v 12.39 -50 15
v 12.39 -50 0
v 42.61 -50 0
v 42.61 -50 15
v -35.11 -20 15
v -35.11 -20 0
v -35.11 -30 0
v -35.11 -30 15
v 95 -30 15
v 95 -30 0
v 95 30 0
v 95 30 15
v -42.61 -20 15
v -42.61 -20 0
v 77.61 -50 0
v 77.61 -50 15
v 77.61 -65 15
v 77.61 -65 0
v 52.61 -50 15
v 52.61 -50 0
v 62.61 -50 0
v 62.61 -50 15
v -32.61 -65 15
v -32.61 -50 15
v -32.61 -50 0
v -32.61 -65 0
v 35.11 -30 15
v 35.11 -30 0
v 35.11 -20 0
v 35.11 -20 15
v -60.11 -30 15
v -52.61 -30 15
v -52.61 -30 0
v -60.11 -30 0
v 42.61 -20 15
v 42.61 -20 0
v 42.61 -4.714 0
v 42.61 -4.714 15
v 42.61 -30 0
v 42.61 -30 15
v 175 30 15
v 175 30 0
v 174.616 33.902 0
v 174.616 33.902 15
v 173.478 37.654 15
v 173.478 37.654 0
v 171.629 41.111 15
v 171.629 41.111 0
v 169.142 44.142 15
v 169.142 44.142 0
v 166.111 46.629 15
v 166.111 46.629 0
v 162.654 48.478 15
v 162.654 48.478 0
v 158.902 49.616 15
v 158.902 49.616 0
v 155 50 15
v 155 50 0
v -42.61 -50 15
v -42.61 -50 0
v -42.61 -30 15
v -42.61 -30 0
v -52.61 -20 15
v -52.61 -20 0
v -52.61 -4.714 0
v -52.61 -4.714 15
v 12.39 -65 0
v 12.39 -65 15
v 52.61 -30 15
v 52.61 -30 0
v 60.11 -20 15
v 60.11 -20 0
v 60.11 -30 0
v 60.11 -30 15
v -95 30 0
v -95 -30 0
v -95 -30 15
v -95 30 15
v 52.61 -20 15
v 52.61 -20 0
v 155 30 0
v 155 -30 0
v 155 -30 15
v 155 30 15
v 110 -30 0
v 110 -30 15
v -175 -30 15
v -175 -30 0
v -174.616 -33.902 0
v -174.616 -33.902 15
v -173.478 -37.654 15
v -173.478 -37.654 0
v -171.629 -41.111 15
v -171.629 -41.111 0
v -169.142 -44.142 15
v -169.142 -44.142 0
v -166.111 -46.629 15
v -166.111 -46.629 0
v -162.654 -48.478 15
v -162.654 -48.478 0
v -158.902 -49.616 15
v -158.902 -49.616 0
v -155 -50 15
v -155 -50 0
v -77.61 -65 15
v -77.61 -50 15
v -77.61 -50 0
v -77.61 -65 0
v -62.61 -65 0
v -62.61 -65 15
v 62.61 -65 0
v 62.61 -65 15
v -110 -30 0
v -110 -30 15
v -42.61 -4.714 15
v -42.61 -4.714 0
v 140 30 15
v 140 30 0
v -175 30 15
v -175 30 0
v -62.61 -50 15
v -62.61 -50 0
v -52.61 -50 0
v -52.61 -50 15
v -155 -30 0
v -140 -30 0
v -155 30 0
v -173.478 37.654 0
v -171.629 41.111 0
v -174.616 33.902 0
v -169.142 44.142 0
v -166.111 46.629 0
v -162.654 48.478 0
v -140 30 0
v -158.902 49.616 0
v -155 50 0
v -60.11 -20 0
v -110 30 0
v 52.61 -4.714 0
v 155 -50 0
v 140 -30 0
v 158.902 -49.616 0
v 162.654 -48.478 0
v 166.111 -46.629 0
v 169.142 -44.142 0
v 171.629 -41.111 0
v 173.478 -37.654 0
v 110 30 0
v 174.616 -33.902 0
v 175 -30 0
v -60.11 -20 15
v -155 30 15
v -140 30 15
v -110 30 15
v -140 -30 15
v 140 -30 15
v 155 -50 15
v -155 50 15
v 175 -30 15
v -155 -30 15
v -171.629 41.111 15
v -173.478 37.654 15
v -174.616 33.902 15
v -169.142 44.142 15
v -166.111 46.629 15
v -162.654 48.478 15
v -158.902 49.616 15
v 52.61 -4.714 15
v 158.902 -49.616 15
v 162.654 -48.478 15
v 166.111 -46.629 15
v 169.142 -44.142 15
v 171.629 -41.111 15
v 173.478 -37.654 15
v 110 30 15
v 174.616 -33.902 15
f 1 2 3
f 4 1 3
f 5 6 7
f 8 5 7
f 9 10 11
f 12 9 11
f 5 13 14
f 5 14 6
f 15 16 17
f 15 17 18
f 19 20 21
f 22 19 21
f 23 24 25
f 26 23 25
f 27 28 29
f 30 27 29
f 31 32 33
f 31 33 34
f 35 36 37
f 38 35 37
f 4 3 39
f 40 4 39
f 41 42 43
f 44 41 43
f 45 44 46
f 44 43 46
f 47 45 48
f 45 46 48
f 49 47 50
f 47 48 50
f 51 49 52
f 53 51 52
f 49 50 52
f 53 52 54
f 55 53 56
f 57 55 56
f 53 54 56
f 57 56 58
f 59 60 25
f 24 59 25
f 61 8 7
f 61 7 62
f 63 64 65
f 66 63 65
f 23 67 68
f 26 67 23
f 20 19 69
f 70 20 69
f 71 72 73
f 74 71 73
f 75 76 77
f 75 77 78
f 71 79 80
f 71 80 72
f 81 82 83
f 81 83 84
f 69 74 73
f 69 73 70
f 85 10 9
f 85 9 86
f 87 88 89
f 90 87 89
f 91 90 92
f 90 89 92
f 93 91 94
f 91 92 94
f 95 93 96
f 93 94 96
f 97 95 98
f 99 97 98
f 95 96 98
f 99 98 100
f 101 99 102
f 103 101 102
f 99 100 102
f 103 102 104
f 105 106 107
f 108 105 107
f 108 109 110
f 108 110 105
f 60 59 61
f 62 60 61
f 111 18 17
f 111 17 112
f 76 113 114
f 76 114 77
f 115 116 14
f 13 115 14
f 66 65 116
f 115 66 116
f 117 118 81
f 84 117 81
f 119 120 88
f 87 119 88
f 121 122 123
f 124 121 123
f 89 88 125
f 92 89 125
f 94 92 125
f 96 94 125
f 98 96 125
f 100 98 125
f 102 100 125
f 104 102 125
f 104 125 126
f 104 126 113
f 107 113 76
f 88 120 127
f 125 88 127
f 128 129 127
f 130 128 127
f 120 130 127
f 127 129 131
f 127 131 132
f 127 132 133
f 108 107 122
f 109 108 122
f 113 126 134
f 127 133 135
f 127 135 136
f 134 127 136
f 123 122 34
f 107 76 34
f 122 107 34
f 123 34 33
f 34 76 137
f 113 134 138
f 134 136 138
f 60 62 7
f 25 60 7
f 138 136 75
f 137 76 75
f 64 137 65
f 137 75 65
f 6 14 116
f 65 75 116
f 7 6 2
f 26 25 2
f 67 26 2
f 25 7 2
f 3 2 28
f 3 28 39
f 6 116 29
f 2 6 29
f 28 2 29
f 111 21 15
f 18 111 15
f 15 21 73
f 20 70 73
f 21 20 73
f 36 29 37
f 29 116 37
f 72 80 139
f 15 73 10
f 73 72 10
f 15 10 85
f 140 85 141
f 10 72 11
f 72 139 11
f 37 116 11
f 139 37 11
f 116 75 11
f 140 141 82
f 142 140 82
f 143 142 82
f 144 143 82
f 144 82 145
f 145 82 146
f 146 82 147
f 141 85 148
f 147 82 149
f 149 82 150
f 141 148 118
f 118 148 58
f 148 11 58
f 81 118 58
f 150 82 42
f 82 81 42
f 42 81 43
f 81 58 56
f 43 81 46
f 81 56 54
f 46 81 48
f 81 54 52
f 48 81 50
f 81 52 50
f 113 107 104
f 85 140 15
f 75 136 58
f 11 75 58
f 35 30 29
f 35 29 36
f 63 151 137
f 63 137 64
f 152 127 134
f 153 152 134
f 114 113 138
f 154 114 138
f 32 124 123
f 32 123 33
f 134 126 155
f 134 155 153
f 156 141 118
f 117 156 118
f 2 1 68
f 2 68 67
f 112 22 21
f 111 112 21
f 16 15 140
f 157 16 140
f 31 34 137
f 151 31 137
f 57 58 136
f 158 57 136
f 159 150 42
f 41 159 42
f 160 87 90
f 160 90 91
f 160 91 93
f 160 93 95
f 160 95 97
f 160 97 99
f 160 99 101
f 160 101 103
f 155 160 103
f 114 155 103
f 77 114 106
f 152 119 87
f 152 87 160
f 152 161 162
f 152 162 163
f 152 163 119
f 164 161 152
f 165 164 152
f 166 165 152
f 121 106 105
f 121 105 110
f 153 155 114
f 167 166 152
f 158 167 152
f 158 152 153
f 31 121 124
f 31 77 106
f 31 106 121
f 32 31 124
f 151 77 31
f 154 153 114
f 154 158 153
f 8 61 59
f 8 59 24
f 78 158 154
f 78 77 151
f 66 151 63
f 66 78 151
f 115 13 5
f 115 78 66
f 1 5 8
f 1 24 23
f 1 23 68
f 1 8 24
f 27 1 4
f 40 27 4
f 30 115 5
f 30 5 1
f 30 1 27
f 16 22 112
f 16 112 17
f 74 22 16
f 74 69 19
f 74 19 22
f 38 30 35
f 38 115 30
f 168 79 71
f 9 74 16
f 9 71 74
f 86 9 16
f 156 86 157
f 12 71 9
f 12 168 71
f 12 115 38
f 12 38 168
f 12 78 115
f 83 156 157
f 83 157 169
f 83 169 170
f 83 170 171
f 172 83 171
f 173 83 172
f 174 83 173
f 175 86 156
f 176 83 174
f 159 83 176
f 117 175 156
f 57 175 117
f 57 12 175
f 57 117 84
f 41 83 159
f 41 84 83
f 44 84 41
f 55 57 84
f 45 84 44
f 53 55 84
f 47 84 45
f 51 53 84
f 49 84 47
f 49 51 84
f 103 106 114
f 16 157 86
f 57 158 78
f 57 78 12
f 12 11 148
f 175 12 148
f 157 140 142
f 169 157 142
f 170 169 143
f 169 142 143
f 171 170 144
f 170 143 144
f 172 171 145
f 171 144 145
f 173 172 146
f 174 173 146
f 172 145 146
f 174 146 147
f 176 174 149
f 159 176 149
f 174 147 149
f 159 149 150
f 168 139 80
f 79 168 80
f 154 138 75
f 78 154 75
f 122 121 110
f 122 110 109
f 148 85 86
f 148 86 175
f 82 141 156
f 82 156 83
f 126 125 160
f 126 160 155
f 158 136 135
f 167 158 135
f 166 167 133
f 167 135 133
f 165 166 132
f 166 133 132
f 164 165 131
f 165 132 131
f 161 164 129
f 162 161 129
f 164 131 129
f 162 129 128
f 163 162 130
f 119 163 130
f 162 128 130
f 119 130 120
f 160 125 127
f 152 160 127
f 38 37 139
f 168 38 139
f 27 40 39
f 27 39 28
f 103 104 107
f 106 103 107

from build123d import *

# Parameters (mm, degrees)
ESQUISSE1_W             = 15
ESQUISSE1_H             = 60
BOSS_EXTRU_1_DEPTH      = 15
ESQUISSE2_W             = 10
ESQUISSE2_H             = 8.70960714
ESQUISSE2_H_2           = 11.830290252
ENL_V_MAT_EXTRU_1_DEPTH = 183.619823677
ESQUISSE3_W             = 15
ESQUISSE3_H             = 15
ESQUISSE3_W_2           = 45
BOSS_EXTRU_2_DEPTH      = 15


with BuildPart() as part:
    # Esquisse1 → Boss.-Extru.1 (new body)
    with BuildSketch(Plane.XY):
        with BuildLine():
            ThreePointArc((-175, -30), (-169.142135624, -44.142135624), (-155, -50))
            Line((-155, -50), (155, -50))
            ThreePointArc((155, -50), (169.142135624, -44.142135624), (175, -30))
            Line((175, -30), (175, 30))
            ThreePointArc((175, 30), (169.142135624, 44.142135624), (155, 50))
            Line((155, 50), (-155, 50))
            ThreePointArc((-155, 50), (-169.142135624, 44.142135624), (-175, 30))
            Line((-175, 30), (-175, -30))
        make_face()
        with Locations((-147.5, 0)):
            Rectangle(ESQUISSE1_W, ESQUISSE1_H, mode=Mode.SUBTRACT)
        Polygon((-52.61, -30), (-60.11, -30), (-60.11, -20), (-52.61, -20), (-52.61, -4.714066344), (-42.61, -4.714066344), (-42.61, -20), (-35.11, -20), (-35.11, -30), (-42.61, -30), (-42.61, -45.27278392), (-52.61, -45.27278392), align=None, mode=Mode.SUBTRACT)
        Polygon((42.61, -30), (35.11, -30), (35.11, -20), (42.61, -20), (42.61, -4.714066344), (52.61, -4.714066344), (52.61, -20), (60.11, -20), (60.11, -30), (52.61, -30), (52.61, -45.27278392), (42.61, -45.27278392), align=None, mode=Mode.SUBTRACT)
        with Locations((-102.5, 0)):
            Rectangle(ESQUISSE1_W, ESQUISSE1_H, mode=Mode.SUBTRACT)
        with Locations((102.5, 0)):
            Rectangle(ESQUISSE1_W, ESQUISSE1_H, mode=Mode.SUBTRACT)
        with Locations((147.5, 0)):
            Rectangle(ESQUISSE1_W, ESQUISSE1_H, mode=Mode.SUBTRACT)
    extrude(amount=BOSS_EXTRU_1_DEPTH)

    # Esquisse2 → Enlèv. mat.-Extru.1 (cut, through all)
    with BuildSketch(Plane.XY.offset(15)):
        with Locations((47.61, -49.62758749)):
            Rectangle(ESQUISSE2_W, ESQUISSE2_H)
        with Locations((-47.61, -51.187929046)):
            Rectangle(ESQUISSE2_W, ESQUISSE2_H_2)
    extrude(amount=-ENL_V_MAT_EXTRU_1_DEPTH, mode=Mode.SUBTRACT)

    # Esquisse3 → Boss.-Extru.2 (add)
    with BuildSketch(Plane(origin=(0, -50, 0), x_dir=(-1, 0, 0), z_dir=(0, -1, 0))):
        with Locations((-70.11, -7.5)):
            Rectangle(ESQUISSE3_W, ESQUISSE3_H)
        with Locations((10.11, -7.5)):
            Rectangle(ESQUISSE3_W_2, ESQUISSE3_H)
        with Locations((70.11, -7.5)):
            Rectangle(ESQUISSE3_W, ESQUISSE3_H)
    extrude(amount=BOSS_EXTRU_2_DEPTH)


solid = part.part
